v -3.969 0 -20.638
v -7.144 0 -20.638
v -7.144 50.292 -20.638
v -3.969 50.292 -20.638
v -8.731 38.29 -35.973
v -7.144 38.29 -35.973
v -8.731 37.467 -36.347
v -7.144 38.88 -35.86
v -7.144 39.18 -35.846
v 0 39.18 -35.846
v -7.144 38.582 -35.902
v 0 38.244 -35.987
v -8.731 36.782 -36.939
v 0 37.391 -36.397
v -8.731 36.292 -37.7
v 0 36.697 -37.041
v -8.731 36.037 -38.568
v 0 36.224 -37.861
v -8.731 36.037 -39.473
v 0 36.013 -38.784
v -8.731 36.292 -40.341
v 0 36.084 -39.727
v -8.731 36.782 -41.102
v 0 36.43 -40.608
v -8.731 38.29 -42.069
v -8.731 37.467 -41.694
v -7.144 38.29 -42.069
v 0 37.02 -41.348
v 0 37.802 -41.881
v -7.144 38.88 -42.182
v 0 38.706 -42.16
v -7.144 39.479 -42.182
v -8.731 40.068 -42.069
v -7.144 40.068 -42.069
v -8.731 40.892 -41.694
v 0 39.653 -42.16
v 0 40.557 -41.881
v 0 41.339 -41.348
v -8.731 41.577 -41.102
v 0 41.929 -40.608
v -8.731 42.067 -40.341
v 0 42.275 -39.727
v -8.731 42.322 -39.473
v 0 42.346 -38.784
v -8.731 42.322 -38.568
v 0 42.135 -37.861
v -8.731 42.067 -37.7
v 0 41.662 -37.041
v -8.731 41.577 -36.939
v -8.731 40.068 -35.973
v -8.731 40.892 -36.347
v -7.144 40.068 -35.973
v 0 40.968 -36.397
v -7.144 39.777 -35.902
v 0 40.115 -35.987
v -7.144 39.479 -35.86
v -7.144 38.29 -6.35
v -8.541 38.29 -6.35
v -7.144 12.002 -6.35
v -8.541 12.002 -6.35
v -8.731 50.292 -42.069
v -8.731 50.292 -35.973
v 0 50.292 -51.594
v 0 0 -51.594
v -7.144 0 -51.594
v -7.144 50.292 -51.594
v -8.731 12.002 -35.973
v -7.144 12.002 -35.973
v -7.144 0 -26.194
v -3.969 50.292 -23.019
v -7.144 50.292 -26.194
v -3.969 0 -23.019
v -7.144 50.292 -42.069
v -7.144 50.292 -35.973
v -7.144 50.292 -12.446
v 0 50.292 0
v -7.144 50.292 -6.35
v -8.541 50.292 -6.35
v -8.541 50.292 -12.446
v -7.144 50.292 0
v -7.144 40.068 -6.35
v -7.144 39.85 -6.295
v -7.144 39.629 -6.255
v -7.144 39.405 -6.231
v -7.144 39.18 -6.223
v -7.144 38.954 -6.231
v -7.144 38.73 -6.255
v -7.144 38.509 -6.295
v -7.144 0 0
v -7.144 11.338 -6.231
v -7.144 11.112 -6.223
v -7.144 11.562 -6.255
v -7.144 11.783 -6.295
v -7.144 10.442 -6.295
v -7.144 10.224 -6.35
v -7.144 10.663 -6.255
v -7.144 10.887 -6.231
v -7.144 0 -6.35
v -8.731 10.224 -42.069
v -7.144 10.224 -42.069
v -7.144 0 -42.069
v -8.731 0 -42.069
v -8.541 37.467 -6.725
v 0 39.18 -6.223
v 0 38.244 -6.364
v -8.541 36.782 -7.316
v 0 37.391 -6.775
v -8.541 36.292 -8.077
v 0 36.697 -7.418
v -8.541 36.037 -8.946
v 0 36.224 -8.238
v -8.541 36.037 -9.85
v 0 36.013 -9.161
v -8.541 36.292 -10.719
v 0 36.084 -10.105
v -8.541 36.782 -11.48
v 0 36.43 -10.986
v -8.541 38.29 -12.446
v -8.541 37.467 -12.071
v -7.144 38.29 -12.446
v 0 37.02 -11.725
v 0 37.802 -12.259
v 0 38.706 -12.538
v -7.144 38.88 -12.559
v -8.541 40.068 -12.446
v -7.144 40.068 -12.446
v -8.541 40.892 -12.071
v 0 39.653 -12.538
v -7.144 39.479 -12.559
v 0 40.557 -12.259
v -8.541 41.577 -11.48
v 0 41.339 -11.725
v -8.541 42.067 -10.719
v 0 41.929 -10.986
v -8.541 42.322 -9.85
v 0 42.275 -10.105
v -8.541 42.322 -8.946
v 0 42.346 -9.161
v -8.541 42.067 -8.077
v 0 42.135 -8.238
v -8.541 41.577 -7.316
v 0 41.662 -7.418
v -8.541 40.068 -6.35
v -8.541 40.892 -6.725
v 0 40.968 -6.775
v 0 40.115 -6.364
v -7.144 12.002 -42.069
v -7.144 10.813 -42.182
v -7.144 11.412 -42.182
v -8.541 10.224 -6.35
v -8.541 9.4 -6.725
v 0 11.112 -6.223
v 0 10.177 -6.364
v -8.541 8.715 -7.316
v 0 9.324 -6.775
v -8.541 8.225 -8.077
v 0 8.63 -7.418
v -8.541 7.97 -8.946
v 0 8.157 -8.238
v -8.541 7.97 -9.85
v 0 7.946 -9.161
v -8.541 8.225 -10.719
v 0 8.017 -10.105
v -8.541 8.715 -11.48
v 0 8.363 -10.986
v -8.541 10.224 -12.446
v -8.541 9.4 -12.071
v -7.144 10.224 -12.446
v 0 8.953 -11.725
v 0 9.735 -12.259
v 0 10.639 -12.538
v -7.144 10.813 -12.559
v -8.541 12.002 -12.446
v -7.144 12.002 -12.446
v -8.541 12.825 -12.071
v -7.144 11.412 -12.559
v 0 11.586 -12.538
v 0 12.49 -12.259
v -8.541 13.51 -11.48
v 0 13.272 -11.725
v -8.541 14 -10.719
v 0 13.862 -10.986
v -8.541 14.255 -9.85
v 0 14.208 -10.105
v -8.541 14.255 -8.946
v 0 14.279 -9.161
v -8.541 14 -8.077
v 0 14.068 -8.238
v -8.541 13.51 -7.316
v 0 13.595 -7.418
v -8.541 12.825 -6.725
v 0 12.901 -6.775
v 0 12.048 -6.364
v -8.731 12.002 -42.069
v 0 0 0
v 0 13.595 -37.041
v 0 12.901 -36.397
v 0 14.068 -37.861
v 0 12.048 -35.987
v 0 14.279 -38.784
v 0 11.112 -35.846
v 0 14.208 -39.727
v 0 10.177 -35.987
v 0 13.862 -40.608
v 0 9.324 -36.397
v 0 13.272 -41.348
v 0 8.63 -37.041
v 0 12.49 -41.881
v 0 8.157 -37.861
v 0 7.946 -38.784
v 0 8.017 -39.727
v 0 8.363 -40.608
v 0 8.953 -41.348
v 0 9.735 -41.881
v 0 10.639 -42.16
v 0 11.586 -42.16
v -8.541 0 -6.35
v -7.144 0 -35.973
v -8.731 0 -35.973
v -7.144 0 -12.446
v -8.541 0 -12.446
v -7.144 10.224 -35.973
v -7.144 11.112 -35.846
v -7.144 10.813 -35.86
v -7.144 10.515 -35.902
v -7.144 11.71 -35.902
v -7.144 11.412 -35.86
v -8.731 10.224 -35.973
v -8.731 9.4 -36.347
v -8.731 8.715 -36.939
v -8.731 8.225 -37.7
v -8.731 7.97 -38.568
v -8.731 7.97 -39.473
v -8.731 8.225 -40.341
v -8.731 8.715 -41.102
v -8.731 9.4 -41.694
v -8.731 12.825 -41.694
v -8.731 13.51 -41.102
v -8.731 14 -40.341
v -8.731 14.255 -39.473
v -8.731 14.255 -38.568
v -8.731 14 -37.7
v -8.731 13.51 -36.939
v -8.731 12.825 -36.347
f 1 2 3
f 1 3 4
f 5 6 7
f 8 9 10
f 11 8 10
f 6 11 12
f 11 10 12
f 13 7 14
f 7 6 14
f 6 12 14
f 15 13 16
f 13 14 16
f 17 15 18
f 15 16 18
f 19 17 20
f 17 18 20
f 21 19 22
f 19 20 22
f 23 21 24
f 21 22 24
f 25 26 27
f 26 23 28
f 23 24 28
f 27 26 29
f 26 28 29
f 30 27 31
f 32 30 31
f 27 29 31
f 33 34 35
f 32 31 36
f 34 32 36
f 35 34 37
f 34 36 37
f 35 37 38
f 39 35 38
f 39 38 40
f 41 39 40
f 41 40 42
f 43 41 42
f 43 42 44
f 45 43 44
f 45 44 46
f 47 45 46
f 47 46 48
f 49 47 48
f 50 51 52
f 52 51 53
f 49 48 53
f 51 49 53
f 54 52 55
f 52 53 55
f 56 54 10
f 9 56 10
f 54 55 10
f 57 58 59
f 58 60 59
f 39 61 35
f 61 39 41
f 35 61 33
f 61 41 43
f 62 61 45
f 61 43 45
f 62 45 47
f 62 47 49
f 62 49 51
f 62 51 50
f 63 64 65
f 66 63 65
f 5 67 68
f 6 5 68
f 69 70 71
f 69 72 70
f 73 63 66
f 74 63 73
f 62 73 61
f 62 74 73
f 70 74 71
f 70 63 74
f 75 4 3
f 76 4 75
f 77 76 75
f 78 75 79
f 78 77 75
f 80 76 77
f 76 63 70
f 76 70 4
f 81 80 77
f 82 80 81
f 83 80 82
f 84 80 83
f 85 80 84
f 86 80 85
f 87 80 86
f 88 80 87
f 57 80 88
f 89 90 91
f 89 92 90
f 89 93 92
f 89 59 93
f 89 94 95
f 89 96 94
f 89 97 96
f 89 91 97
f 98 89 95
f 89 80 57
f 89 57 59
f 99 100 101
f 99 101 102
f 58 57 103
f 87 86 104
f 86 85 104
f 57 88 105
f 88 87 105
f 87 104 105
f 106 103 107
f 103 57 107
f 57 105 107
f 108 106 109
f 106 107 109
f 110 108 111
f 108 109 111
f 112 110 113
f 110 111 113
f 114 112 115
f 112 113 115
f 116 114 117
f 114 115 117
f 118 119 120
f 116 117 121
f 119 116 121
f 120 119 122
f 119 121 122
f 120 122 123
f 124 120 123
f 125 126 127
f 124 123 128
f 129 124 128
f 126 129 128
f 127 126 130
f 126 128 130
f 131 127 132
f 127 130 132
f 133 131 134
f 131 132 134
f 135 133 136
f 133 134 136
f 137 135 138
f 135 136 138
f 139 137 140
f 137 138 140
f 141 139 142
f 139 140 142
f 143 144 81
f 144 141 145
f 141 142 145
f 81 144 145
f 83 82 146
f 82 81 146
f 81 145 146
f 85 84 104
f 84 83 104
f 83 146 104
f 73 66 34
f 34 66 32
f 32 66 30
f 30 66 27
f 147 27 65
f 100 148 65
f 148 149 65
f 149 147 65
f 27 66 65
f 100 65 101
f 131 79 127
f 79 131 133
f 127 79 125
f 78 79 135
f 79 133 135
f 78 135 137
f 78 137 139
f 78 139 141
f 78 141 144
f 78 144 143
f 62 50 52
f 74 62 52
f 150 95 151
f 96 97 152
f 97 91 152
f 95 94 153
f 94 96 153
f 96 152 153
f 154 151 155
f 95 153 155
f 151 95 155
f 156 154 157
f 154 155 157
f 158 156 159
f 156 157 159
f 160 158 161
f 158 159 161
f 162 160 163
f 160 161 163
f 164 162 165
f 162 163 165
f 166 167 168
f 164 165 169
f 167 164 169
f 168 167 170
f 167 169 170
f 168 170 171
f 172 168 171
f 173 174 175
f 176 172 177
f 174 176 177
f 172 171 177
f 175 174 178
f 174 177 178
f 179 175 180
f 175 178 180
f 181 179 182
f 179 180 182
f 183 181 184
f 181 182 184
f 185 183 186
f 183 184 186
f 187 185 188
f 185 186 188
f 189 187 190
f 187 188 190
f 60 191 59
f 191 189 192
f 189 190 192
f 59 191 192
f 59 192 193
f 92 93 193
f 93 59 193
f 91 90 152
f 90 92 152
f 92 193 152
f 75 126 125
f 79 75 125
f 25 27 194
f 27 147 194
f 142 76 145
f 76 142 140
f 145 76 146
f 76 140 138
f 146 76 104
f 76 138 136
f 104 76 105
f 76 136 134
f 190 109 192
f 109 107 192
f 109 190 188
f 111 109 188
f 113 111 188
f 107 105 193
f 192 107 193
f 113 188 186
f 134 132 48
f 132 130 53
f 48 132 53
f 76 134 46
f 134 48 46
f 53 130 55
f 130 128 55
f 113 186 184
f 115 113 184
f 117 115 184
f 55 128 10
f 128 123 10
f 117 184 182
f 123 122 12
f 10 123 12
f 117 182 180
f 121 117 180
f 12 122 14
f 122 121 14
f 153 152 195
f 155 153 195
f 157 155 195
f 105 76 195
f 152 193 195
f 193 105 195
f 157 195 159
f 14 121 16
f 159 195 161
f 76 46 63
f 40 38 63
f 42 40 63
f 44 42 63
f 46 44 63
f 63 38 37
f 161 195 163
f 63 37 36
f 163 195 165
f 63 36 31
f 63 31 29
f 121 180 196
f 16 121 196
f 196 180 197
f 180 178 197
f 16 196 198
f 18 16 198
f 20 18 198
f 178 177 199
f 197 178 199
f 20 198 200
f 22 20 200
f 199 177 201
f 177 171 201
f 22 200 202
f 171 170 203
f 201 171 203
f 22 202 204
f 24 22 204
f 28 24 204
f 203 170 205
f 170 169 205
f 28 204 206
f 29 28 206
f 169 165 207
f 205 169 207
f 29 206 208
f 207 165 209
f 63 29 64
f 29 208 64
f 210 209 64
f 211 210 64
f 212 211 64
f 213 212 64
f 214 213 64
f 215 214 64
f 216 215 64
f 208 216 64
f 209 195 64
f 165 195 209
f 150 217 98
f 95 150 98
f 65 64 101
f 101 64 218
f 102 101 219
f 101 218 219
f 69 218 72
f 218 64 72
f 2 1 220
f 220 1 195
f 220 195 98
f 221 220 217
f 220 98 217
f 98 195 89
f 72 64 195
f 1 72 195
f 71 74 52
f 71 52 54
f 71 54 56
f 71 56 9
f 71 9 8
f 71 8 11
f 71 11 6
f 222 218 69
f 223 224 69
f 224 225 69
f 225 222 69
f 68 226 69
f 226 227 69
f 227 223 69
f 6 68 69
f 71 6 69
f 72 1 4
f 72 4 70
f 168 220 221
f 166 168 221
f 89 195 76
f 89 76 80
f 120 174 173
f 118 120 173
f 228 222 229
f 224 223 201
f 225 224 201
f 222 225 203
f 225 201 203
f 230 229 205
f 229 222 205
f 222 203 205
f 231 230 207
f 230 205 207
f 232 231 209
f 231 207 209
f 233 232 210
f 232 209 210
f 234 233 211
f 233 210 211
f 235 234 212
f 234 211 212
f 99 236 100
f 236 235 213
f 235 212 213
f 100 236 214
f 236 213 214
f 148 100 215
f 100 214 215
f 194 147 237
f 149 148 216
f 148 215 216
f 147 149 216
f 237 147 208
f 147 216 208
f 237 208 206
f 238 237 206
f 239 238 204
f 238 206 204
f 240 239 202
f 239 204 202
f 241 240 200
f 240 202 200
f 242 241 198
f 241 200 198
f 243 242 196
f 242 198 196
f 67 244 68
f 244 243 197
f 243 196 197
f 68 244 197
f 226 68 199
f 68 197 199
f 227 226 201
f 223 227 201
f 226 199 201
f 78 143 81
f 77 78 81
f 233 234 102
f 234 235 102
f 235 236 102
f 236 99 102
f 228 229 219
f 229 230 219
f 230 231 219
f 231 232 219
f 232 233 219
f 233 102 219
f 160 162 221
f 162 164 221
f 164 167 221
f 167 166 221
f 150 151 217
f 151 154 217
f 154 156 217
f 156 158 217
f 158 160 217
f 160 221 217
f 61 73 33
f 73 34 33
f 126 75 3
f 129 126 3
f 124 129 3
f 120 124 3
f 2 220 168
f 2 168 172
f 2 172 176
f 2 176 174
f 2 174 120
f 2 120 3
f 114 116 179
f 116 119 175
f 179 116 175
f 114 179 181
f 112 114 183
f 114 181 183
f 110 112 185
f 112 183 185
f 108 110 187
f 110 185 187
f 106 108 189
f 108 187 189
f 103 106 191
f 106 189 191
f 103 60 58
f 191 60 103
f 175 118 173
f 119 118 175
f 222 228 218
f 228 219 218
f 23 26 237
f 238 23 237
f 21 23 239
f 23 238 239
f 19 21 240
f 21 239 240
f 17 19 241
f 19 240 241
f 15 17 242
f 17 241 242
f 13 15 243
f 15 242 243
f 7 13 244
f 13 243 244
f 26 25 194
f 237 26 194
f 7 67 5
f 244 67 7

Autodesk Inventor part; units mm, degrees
ref_plane "YZ Plane" through (0, 0, 0) normal (1, 0, 0) x (0, 1, 0)
ref_plane "XZ Plane" through (0, 0, 0) normal (0, 1, 0) x (-1, 0, 0)
ref_plane "XY Plane" through (0, 0, 0) normal (0, 0, 1) x (1, 0, 0)
sketch "Sketch1" plane through (0, 0, 0) normal (0, 1, 0) x (-1, 0, 0)
  line L0 (0, 0) -> (0, -51.5938)
  line L1 (0, -51.5938) -> (7.1438, -51.5938)
  line L2 (7.1438, -42.0688) -> (8.7312, -42.0688)
  line L3 (8.7312, -42.0688) -> (8.7312, -35.9728)
  line L4 (8.7312, -35.9728) -> (7.1437, -35.9728)
  line L5 (7.1438, -51.5938) -> (7.1438, -42.0688)
  line L6 (7.1437, -35.9728) -> (7.1437, -26.1938)
  line L7 (0, 0) -> (7.1437, 0)
  line L8 (7.1438, -20.6375) -> (3.9688, -20.6375)
  line L9 (3.9688, -20.6375) -> (3.9688, -23.0188)
  line L10 (3.9688, -23.0188) -> (7.1437, -26.1938)
  line L11 (7.1438, -12.446) -> (8.5408, -12.446)
  line L12 (8.5408, -12.446) -> (8.5408, -6.35)
  line L13 (8.5408, -6.35) -> (7.1438, -6.35)
  line L14 (7.1437, 0) -> (7.1438, -6.35)
  line L15 (7.1438, -12.446) -> (7.1438, -20.6375)
  dimension "d2" = 51.5938
  dimension "d3" = 7.1437
  dimension "d36" = 7.1437
  dimension "d42" = 2.3813
  dimension "d43" = 1.397
  dimension "d44" = 1.397
  dimension "d45" = 6.096
  dimension "d64" = 6.35
  dimension "d65" = 9.525
  dimension "d66" = 6.096
  dimension "d67" = 1.5875
  dimension "d68" = 9.779
  dimension "d69" = 3.9688
  dimension "d71" = 20.6375
extrude "Extrusion1" add sketch "Sketch1" along normal blind 50.292
sketch "Sketch3" plane through (-8.7312, 0, -42.0688) normal (-1, 0, 0) x (0, 0, 1)
  line L0 (6.096, 0) -> (6.096, 50.292) projected
  line L1 (0, 50.292) -> (6.096, 50.292) projected
  line L2 (0, 0) -> (6.096, 0) projected
  line L3 (35.7188, 0) -> (35.7188, 50.292) projected
  point P0 (42.0688, 0)
  point P1 (3.048, 39.1795)
  point P2 (3.048, 11.1125)
  point P3 (32.6708, 39.1795)
  point P4 (32.6708, 11.1125)
  dimension "d49" = 3.048
  dimension "d50" = 3.048
  dimension "d51" = 11.1125
  dimension "d52" = 11.1125
  dimension "d60" = 3.048
  dimension "d61" = 3.048
  dimension "d62" = 0
  dimension "d63" = 0
hole "Hole2" at (-8.7312, 39.1795, -39.0208) at (-8.7312, 11.1125, -39.0208) at (-8.7312, 39.1795, -9.398) at (-8.7312, 11.1125, -9.398) direction (1, 0, 0) diameter 6.35 end through all
equation "\"d36\" = d3"
equation "\"d43\" = d14"
equation "\"d44\" = d14"
equation "\"d45\" = d15"
equation "\"d14\" = 1.397"
equation "\"d15\" = 6.096"
properties part number "80-20 extrusion rail"
